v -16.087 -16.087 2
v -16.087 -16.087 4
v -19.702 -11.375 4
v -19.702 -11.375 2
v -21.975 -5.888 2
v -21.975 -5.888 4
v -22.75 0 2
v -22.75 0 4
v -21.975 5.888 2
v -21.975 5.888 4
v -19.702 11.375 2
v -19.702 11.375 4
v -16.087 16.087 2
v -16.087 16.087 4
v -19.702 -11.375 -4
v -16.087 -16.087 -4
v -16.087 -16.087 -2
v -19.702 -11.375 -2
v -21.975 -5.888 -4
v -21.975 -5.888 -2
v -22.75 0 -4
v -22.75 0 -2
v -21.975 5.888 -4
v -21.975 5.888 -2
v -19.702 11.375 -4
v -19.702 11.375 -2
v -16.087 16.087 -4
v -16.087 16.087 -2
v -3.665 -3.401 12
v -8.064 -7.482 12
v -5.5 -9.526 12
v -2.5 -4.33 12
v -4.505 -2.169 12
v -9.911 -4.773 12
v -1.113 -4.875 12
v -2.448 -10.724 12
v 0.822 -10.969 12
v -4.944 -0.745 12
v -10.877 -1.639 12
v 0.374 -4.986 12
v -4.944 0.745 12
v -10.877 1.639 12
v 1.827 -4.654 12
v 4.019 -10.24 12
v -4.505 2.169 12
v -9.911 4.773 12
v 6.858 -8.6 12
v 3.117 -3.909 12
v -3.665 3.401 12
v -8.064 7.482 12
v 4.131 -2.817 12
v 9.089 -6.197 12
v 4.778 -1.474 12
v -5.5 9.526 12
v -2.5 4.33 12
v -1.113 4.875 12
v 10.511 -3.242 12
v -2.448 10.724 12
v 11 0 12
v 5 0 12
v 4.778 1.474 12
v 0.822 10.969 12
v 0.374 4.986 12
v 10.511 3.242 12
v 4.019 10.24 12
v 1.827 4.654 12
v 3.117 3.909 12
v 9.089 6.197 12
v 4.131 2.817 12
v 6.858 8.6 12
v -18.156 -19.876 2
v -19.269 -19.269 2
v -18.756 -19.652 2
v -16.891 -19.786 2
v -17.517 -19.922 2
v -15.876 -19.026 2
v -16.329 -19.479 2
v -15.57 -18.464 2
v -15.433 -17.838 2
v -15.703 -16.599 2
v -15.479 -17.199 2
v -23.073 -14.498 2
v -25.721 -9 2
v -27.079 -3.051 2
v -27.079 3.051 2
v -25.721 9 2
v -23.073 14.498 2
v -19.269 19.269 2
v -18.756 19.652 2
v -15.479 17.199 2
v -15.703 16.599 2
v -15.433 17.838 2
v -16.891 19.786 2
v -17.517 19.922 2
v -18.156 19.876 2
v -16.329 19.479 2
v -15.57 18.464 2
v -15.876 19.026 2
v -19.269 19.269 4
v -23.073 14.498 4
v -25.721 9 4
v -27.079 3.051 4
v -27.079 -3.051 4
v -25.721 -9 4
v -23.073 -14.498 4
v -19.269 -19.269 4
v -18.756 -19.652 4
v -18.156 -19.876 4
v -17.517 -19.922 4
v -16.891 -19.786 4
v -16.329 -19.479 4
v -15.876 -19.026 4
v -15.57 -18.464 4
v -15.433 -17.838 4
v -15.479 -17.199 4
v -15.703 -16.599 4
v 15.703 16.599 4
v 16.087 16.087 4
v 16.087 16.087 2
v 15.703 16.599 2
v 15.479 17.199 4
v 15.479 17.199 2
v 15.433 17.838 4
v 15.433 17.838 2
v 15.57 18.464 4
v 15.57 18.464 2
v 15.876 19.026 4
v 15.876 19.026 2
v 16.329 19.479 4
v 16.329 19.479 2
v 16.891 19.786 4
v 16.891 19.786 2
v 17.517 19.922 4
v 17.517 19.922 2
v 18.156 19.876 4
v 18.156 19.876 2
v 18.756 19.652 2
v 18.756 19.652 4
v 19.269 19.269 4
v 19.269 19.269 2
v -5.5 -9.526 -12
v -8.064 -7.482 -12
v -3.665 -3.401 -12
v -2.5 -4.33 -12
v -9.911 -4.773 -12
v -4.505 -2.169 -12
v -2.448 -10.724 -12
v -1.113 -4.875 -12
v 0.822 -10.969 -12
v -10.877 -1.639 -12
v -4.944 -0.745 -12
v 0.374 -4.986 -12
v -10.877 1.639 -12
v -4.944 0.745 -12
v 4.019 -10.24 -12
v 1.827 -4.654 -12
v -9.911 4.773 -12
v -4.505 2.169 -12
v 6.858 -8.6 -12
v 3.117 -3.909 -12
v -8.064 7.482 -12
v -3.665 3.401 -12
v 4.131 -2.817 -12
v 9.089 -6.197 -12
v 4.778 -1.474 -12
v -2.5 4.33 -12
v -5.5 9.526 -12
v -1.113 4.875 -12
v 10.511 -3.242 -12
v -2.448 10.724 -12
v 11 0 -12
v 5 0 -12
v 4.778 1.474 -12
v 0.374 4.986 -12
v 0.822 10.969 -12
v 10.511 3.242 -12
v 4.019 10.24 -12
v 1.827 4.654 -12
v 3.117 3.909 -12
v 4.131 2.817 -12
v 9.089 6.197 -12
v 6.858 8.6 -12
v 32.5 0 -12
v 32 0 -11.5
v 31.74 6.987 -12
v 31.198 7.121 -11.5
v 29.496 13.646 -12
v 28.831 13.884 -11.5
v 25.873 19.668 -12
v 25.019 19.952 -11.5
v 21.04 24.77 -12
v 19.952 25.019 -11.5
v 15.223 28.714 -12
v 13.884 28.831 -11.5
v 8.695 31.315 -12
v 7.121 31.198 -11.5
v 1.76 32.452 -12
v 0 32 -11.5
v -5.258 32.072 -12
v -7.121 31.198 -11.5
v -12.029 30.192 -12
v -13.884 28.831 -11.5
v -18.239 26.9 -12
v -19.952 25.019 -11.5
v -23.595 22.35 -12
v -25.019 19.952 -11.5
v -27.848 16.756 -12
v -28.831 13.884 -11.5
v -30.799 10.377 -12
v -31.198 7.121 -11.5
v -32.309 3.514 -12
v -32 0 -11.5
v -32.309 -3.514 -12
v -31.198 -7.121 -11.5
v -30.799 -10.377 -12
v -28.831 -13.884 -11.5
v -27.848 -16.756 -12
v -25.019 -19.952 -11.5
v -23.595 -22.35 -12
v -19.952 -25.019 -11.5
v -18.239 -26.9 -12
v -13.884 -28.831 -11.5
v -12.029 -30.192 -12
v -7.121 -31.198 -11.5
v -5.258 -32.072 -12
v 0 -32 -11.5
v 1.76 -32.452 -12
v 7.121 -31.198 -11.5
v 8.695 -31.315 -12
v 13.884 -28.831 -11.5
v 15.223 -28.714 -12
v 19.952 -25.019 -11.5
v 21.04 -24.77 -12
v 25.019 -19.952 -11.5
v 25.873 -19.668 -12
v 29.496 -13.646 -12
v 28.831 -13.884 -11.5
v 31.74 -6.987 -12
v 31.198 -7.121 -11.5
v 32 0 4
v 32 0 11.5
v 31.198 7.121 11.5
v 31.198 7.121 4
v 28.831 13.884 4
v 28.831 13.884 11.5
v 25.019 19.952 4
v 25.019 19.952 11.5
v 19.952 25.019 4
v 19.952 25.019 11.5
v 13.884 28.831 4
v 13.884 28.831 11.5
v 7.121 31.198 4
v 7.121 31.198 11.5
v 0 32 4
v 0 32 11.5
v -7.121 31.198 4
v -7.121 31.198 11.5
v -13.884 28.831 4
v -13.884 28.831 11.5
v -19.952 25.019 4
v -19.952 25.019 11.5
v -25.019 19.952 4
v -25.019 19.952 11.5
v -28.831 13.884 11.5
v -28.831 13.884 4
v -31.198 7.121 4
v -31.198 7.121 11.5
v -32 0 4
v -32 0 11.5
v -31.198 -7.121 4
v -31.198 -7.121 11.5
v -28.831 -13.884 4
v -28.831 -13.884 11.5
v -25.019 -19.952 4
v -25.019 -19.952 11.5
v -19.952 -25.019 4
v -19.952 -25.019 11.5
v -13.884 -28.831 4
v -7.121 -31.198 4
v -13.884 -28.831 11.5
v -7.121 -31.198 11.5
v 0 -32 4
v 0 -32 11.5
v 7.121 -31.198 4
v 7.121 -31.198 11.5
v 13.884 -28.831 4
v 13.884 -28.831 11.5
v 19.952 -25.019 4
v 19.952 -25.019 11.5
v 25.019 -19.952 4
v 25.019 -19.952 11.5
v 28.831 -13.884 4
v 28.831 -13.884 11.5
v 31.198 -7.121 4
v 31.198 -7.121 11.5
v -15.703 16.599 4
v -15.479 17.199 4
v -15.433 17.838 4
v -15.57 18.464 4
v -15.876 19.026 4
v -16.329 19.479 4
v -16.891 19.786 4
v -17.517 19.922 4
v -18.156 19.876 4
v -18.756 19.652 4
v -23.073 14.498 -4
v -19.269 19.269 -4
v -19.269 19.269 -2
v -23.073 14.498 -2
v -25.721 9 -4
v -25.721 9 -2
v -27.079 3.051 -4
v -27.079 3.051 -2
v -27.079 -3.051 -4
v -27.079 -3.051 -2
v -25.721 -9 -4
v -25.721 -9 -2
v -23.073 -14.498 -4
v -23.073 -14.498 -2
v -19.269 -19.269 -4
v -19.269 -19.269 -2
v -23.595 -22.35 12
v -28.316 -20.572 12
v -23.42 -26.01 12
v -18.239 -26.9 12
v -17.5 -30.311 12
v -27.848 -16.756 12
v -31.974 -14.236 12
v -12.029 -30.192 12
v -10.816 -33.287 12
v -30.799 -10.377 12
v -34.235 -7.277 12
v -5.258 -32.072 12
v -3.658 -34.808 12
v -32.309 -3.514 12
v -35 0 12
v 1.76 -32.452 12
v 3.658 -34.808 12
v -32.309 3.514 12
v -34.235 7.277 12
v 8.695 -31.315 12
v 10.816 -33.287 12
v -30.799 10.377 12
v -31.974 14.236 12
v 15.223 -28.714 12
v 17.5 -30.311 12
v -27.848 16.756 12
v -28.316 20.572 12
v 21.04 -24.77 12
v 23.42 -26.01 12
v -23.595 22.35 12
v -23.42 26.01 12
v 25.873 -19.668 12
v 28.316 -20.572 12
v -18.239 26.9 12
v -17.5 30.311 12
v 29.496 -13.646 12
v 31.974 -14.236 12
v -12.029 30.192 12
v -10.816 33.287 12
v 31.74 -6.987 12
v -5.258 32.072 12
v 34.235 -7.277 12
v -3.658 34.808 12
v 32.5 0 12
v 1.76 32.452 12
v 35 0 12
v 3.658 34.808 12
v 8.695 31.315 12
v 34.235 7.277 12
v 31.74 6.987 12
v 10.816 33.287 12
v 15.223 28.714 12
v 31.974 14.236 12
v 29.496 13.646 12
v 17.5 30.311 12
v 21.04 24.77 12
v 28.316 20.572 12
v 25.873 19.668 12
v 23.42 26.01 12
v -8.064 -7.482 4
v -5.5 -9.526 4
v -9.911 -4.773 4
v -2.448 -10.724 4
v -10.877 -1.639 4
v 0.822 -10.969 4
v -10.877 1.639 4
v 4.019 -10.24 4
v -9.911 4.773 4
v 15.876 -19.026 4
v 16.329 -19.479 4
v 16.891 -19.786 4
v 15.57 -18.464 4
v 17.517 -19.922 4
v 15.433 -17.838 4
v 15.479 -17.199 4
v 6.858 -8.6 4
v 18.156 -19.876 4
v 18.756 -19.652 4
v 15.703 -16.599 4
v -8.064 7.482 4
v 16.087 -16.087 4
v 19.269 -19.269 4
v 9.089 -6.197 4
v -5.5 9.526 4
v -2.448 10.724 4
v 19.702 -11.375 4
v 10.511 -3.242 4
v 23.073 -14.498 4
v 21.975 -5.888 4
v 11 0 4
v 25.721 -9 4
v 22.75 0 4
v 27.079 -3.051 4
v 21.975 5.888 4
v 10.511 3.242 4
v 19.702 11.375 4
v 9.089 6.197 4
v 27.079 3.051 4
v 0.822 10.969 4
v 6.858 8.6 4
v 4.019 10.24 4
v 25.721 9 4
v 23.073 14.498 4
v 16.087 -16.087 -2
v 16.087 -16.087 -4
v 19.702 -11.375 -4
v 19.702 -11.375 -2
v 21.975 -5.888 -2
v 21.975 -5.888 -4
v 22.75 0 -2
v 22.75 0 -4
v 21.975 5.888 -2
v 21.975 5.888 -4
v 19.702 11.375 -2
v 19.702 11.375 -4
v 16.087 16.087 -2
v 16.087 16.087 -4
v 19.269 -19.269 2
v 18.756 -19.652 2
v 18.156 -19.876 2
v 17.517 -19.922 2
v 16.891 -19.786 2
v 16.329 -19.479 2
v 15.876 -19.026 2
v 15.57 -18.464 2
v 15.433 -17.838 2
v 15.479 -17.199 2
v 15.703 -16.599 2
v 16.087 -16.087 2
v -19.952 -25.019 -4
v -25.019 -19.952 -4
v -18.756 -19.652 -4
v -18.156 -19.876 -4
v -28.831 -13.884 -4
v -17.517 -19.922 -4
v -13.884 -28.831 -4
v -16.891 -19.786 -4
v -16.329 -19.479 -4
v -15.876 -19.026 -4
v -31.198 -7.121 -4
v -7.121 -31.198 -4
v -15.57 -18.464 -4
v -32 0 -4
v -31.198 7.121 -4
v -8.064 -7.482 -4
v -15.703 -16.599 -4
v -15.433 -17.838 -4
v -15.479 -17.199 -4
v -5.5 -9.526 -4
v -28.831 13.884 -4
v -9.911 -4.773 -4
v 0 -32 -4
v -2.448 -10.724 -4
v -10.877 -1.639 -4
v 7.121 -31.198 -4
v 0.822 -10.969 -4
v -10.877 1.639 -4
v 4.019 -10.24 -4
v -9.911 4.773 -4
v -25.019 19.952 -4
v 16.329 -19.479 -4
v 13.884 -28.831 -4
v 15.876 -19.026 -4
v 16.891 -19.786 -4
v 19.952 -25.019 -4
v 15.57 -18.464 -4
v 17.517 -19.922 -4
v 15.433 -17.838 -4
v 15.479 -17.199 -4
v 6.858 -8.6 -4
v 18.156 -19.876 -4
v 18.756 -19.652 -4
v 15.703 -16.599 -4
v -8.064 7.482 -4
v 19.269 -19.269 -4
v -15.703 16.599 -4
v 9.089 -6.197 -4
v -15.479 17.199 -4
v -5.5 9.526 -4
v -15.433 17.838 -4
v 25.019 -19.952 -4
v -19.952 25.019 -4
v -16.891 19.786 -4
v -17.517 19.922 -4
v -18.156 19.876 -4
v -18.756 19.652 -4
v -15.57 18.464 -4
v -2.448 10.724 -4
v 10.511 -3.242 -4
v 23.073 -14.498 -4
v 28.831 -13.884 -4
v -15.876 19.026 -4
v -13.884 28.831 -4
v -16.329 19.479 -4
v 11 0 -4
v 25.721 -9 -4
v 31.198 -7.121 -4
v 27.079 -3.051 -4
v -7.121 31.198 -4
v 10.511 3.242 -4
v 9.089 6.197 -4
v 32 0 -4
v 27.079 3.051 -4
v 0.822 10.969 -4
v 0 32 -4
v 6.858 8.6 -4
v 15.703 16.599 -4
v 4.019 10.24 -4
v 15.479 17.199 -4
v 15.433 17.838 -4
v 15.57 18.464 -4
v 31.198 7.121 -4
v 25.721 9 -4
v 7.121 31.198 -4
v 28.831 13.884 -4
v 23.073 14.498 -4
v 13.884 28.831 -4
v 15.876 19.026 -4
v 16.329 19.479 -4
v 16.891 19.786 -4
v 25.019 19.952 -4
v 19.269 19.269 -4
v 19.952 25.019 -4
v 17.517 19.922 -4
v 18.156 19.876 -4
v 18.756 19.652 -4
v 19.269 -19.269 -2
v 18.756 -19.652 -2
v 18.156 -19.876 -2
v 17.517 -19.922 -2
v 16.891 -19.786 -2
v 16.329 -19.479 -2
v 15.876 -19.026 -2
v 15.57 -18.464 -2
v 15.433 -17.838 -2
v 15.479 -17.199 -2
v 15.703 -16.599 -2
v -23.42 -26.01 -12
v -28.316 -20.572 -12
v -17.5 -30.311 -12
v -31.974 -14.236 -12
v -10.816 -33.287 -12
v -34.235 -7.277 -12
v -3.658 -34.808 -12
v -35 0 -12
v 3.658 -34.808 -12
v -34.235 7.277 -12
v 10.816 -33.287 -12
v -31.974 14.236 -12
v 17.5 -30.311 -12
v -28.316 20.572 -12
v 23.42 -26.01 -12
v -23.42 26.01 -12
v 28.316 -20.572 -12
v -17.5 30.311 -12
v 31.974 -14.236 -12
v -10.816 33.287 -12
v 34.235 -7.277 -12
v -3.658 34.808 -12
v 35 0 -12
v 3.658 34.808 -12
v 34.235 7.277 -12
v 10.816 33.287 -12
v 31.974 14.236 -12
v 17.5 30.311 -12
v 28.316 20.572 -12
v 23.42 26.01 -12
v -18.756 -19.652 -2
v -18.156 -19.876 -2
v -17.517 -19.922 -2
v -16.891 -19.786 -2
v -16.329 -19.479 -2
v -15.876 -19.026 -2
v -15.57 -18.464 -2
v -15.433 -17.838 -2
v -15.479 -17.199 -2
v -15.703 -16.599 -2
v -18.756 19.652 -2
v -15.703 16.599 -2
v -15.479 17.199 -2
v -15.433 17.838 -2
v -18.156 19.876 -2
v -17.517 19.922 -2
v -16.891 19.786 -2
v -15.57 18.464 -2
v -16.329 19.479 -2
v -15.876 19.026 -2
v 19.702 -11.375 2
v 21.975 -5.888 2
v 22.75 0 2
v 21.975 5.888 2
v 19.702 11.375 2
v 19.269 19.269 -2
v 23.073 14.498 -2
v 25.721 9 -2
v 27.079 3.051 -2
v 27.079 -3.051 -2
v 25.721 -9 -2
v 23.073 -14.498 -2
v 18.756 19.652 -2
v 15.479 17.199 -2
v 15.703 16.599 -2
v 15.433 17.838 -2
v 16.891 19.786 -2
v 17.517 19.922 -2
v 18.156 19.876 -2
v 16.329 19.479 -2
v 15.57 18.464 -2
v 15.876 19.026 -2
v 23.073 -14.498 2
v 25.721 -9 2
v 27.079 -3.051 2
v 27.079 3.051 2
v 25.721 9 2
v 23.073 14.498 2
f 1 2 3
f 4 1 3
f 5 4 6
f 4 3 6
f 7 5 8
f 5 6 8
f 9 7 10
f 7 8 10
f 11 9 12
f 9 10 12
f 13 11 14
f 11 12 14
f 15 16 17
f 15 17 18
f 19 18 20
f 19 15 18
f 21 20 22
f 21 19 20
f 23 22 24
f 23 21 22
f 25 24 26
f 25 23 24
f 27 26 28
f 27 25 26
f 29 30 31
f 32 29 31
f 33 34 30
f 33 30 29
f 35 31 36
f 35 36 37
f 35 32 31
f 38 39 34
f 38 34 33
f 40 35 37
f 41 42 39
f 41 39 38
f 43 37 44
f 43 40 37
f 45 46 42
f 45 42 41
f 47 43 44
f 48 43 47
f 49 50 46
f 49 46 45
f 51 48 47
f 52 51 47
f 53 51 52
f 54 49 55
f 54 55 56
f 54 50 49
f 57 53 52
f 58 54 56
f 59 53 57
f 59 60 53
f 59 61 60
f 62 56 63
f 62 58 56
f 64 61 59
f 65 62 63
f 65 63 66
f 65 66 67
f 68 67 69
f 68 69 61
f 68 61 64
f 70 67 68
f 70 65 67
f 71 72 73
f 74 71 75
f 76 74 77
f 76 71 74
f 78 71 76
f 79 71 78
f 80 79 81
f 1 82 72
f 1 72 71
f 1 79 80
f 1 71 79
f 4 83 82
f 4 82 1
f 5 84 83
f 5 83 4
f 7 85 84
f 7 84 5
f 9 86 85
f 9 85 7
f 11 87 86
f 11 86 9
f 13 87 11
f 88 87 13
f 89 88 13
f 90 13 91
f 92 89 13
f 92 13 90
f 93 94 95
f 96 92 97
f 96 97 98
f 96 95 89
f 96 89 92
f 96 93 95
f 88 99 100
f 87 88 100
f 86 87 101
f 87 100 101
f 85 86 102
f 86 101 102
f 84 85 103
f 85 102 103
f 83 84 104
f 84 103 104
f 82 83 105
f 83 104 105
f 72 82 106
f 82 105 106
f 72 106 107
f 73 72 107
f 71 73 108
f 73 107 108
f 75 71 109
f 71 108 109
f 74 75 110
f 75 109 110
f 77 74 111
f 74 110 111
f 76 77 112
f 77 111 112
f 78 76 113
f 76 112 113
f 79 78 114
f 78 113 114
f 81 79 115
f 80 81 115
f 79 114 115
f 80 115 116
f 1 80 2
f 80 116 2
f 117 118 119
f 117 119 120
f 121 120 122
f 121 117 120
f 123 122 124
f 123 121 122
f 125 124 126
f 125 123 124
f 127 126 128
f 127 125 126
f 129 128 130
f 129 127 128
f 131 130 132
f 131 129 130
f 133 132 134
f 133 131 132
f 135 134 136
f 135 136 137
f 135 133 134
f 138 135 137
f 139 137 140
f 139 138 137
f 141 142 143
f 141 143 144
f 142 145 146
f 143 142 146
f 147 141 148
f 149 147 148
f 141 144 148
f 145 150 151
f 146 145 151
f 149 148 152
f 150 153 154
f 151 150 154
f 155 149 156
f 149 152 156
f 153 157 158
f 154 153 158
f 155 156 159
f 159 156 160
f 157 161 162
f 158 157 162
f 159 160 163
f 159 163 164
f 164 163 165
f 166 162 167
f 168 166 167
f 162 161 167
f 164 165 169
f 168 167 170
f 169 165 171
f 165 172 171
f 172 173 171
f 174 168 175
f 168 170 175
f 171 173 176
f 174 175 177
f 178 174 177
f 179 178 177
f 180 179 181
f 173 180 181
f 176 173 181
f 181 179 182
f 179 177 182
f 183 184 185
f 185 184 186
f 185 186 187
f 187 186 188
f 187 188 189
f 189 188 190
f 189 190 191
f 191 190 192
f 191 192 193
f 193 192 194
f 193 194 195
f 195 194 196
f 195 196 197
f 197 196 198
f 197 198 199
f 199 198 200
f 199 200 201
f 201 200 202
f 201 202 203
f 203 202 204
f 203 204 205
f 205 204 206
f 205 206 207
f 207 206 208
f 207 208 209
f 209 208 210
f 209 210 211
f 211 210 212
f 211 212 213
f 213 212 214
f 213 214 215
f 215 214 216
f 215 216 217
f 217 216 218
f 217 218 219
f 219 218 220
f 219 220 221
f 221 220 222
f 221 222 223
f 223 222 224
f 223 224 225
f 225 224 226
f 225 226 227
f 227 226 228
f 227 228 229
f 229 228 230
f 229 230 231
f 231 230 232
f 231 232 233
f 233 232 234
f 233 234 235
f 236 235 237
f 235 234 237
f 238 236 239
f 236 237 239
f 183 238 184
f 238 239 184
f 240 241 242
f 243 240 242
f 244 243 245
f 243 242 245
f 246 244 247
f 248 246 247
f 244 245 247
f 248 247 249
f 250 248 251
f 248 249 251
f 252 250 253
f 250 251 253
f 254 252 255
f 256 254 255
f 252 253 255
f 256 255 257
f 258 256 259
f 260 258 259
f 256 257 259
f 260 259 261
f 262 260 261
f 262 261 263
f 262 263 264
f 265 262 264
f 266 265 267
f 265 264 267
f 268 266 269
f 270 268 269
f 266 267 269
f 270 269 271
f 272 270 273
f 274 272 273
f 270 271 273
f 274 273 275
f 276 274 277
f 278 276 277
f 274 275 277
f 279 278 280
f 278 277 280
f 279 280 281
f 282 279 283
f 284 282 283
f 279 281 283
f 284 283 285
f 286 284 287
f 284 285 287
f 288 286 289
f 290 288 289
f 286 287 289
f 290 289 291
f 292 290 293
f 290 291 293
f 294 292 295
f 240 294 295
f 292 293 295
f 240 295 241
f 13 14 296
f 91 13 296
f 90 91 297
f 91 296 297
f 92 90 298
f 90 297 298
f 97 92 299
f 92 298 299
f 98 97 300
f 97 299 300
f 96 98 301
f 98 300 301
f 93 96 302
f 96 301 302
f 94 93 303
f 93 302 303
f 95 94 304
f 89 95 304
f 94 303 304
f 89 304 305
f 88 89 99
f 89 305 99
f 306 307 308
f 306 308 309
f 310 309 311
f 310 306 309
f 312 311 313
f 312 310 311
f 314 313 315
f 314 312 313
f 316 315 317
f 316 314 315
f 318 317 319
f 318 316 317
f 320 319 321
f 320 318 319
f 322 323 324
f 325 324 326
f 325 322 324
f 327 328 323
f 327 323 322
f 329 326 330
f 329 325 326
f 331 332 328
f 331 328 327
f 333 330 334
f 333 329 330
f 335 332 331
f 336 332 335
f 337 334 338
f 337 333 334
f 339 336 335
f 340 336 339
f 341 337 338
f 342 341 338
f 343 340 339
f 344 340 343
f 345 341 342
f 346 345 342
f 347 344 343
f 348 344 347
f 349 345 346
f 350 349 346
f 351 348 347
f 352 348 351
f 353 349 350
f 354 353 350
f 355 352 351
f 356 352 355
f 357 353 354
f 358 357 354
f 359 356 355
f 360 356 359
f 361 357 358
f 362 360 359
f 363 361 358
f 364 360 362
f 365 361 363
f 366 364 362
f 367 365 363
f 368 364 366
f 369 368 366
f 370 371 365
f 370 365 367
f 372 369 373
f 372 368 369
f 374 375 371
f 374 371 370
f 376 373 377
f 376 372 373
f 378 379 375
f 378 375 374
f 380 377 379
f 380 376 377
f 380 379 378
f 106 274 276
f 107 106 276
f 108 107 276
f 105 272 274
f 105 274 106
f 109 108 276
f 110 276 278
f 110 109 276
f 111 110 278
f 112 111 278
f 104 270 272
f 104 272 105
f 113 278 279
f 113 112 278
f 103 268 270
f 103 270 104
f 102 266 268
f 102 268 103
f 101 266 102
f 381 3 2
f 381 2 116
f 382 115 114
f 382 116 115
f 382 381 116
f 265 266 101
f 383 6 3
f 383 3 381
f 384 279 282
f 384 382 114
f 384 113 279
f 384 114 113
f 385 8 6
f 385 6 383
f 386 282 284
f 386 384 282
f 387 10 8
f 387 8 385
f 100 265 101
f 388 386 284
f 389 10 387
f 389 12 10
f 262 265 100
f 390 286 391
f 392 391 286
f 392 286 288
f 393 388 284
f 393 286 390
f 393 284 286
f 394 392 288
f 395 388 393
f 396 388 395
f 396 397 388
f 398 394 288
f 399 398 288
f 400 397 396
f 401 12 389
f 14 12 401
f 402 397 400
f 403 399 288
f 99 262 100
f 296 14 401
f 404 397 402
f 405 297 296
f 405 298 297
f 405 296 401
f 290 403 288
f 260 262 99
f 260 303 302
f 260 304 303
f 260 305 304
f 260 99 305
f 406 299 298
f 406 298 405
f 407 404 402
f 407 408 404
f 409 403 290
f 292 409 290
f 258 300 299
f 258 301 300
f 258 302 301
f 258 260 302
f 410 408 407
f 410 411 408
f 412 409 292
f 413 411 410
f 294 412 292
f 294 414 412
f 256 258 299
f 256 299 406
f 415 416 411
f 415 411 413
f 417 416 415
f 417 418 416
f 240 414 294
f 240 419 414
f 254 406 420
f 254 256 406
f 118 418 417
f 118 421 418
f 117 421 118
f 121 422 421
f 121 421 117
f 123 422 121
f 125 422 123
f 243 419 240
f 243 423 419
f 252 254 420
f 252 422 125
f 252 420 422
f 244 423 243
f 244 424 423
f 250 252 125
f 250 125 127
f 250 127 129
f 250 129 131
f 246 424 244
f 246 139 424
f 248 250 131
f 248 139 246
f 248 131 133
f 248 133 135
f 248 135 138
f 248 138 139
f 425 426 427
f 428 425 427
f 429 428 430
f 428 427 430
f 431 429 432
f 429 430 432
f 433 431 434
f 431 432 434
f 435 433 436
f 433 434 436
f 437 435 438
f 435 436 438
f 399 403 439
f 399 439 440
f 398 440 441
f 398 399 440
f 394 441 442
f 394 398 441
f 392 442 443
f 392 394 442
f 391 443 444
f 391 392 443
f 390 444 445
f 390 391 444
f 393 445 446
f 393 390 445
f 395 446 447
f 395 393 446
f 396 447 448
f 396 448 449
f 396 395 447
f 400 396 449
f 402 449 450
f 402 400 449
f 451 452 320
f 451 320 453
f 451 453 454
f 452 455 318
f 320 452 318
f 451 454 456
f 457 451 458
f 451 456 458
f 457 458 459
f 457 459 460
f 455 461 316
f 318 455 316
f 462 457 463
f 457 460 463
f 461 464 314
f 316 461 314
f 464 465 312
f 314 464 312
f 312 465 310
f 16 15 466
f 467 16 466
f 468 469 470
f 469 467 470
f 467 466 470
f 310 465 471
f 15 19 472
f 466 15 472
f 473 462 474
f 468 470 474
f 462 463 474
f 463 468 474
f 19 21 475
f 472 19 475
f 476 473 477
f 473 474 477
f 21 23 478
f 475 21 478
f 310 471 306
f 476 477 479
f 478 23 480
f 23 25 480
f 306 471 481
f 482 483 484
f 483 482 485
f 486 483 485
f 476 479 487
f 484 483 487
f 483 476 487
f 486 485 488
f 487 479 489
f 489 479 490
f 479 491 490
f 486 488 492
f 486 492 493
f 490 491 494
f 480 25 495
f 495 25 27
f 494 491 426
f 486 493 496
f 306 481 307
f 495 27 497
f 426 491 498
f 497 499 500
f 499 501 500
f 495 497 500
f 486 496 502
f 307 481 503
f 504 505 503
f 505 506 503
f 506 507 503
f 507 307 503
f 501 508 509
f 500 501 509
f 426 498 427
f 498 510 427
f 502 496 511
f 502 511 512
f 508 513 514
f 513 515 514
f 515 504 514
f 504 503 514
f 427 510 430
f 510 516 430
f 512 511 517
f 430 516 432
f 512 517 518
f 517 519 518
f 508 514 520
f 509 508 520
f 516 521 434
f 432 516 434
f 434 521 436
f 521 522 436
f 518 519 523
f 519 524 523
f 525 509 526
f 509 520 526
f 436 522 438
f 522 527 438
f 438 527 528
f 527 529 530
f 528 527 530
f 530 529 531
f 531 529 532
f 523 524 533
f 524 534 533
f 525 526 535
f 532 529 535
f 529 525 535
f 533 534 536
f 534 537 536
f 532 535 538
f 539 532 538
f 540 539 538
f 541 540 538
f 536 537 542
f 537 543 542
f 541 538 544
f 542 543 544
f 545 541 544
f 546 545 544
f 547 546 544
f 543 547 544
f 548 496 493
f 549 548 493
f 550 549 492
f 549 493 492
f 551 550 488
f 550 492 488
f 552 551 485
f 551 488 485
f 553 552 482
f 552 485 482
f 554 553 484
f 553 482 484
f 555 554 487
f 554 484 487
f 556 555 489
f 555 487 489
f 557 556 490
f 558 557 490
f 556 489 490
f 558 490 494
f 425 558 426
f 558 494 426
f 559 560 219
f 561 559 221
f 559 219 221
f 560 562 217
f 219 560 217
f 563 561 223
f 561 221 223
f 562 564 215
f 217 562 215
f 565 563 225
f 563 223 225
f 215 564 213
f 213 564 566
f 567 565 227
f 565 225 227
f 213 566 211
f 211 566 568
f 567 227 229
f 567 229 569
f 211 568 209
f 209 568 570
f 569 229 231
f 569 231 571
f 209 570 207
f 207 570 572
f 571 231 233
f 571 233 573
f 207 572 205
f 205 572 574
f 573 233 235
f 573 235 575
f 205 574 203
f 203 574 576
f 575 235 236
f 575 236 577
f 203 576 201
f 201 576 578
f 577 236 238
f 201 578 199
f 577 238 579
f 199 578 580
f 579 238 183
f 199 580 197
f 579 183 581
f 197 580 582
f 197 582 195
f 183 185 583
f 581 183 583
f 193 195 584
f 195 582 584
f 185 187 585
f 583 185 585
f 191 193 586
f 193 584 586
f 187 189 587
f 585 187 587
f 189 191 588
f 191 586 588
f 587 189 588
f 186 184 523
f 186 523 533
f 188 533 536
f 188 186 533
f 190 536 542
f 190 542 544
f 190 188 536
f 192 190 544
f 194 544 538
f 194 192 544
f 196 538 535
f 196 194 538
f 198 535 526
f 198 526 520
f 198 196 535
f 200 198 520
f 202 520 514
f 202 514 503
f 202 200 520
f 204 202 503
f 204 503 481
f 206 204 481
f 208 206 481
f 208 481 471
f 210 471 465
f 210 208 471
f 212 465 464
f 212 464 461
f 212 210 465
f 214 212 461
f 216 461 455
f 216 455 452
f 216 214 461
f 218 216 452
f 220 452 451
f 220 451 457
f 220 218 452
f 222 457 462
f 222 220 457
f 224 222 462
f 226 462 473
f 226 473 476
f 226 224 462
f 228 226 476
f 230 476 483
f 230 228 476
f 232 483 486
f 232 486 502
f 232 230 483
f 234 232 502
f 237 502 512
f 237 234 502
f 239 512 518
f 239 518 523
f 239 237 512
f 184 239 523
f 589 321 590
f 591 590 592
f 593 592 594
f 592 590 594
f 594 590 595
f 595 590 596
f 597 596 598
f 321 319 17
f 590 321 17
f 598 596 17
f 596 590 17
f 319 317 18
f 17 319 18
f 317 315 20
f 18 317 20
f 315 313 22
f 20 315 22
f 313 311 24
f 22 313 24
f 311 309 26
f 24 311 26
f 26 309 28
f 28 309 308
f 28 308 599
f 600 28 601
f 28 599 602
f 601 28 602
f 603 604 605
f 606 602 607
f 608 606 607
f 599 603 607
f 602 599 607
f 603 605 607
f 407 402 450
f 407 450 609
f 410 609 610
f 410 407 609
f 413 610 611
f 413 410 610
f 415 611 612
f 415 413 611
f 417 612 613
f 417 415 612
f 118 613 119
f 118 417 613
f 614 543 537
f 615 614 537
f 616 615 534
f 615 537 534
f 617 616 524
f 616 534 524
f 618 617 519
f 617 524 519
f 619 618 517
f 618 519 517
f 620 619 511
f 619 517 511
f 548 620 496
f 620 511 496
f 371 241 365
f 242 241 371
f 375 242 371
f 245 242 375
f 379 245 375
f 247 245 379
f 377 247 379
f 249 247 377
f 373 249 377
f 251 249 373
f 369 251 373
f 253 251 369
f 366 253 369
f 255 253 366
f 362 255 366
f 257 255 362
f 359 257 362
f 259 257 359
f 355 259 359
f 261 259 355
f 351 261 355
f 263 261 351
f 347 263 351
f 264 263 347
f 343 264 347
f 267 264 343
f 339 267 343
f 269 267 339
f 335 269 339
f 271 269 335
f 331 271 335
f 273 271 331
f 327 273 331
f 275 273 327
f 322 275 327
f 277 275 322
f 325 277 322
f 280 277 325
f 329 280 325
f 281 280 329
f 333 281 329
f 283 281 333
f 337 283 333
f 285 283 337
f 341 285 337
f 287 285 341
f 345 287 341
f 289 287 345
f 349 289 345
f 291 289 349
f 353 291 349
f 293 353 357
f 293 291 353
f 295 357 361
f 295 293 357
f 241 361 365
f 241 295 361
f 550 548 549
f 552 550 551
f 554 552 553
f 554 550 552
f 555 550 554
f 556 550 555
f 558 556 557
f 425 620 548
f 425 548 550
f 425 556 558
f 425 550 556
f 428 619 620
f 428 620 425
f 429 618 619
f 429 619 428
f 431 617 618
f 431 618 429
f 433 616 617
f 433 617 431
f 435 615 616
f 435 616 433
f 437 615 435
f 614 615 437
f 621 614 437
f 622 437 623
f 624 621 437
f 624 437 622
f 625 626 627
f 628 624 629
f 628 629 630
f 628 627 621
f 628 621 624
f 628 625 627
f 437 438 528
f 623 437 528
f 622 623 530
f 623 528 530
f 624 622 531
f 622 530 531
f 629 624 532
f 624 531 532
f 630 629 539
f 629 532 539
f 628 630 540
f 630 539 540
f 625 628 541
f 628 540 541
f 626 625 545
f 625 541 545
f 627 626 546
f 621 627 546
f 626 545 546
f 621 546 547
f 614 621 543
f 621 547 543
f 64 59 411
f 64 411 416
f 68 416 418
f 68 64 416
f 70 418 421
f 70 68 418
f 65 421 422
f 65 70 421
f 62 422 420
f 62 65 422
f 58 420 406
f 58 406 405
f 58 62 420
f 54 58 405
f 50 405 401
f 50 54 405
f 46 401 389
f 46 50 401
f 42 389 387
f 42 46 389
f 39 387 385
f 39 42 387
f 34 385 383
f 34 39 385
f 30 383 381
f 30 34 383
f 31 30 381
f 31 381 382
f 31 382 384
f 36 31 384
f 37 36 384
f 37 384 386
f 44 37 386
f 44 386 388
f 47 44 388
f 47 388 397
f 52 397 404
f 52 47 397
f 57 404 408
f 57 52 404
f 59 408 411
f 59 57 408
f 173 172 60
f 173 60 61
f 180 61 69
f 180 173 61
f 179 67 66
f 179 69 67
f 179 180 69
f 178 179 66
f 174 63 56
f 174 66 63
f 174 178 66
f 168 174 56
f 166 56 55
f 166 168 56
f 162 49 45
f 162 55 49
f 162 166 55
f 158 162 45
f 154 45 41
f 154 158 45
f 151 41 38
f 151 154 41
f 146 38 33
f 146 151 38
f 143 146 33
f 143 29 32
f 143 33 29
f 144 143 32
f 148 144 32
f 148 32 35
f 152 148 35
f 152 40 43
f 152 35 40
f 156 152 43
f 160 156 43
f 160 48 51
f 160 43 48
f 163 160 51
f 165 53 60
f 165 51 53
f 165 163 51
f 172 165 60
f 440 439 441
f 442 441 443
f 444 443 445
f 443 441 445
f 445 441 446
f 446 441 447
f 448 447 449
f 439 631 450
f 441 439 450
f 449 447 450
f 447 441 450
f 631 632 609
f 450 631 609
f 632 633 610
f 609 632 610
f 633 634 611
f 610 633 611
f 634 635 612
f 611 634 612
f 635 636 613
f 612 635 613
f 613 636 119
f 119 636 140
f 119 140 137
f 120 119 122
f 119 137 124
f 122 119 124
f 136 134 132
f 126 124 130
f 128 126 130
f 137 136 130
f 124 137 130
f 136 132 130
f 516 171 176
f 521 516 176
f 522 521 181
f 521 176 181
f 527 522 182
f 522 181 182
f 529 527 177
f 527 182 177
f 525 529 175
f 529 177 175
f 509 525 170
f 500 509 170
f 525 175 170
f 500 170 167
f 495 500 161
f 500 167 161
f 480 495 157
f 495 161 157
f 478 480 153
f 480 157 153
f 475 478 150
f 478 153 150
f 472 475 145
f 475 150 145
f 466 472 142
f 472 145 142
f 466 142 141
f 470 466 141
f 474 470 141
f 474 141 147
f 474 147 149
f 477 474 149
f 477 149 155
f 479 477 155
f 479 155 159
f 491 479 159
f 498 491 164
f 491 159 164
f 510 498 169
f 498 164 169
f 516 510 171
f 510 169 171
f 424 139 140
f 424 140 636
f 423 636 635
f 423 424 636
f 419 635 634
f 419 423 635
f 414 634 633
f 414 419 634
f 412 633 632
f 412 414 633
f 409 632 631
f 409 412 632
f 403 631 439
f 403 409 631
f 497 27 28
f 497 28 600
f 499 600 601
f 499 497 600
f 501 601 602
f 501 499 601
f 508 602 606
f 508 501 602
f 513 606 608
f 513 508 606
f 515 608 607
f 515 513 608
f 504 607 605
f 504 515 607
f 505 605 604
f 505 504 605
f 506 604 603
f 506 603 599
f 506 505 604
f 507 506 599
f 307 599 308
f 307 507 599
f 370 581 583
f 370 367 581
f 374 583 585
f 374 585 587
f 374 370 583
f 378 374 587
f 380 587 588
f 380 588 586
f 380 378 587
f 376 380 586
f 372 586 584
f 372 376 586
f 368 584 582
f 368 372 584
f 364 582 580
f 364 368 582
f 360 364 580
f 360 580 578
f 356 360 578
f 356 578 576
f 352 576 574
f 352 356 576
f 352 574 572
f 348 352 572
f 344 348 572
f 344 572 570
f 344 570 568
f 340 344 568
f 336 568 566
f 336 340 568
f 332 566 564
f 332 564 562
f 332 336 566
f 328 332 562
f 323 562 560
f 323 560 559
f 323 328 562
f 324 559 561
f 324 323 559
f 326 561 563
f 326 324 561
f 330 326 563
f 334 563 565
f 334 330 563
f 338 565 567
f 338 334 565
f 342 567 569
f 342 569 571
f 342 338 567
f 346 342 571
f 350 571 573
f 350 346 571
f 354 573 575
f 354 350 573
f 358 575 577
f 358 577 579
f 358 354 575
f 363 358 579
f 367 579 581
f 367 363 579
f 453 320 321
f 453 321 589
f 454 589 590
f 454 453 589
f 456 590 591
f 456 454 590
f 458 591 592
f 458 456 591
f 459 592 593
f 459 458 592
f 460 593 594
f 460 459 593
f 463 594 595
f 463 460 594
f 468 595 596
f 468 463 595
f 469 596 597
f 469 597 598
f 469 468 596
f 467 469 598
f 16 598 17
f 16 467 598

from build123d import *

# Parameters (mm, degrees)
SKETCH_1_R               = 35
EXTRUDE_1_DEPTH          = 12
CUT_EXTRUDE_1_DEPTH      = 51.931326313
CUT_EXTRUDE_1_DEPTH_BACK = 51.931326313
SKETCH_2_R               = 5
SKETCH_3_R               = 32
SKETCH_3_R_2             = 11
CUT_EXTRUDE_2_DEPTH      = 8
CUT_EXTRUDE_3_DEPTH      = 2
CHAMFER_1_SIZE           = 0.5


with BuildPart() as part:
    # 草图1 → 凸台-拉伸1 (new, symmetric)
    with BuildSketch(Plane.XY):
        Circle(SKETCH_1_R)
    extrude(amount=EXTRUDE_1_DEPTH, both=True)

    # 草图2 → 切除-拉伸1 (cut, two sides: drawn at the far end of the back side and taken through both)
    with BuildSketch(Plane.XY.offset(-CUT_EXTRUDE_1_DEPTH_BACK)):
        Circle(SKETCH_2_R)
    extrude(amount=CUT_EXTRUDE_1_DEPTH + CUT_EXTRUDE_1_DEPTH_BACK, mode=Mode.SUBTRACT)

    # 草图3 → 切除-拉伸2 (cut)
    with BuildSketch(Plane.XY.offset(12)):
        Circle(SKETCH_3_R)
        Circle(SKETCH_3_R_2, mode=Mode.SUBTRACT)
    cut_extrude_2 = extrude(amount=-CUT_EXTRUDE_2_DEPTH, mode=Mode.SUBTRACT)

    # 草图4 → 切除-拉伸3 (cut)
    with BuildSketch(Plane.XY.offset(4)):
        with BuildLine():
            ThreePointArc((-19.268659787, 19.268659787), (-27.25, 0), (-19.268659787, -19.268659787))
            ThreePointArc((-19.268659787, -19.268659787), (-16.086679272, -19.268659787), (-16.086679272, -16.086679272))
            ThreePointArc((-16.086679272, -16.086679272), (-22.75, 0), (-16.086679272, 16.086679272))
            ThreePointArc((-16.086679272, 16.086679272), (-16.086679272, 19.268659787), (-19.268659787, 19.268659787))
        make_face()
        with BuildLine():
            ThreePointArc((19.268659787, 19.268659787), (27.25, 0), (19.268659787, -19.268659787))
            ThreePointArc((19.268659787, -19.268659787), (16.086679272, -19.268659787), (16.086679272, -16.086679272))
            ThreePointArc((16.086679272, -16.086679272), (22.75, 0), (16.086679272, 16.086679272))
            ThreePointArc((16.086679272, 16.086679272), (16.086679272, 19.268659787), (19.268659787, 19.268659787))
        make_face()
    cut_extrude_3 = extrude(amount=-CUT_EXTRUDE_3_DEPTH, mode=Mode.SUBTRACT)

    # 镜向1: 切除-拉伸2, 切除-拉伸3 across plane
    add(cut_extrude_2.mirror(Plane.XY), mode=Mode.SUBTRACT)
    add(cut_extrude_3.mirror(Plane.XY), mode=Mode.SUBTRACT)

    # 倒角1
    chamfer_1_edges = [part.edges().sort_by_distance(p)[0] for p in [
        (-32, 0, 12),
        (-32, 0, -12),
    ]]
    chamfer(chamfer_1_edges, length=CHAMFER_1_SIZE)


solid = part.part
